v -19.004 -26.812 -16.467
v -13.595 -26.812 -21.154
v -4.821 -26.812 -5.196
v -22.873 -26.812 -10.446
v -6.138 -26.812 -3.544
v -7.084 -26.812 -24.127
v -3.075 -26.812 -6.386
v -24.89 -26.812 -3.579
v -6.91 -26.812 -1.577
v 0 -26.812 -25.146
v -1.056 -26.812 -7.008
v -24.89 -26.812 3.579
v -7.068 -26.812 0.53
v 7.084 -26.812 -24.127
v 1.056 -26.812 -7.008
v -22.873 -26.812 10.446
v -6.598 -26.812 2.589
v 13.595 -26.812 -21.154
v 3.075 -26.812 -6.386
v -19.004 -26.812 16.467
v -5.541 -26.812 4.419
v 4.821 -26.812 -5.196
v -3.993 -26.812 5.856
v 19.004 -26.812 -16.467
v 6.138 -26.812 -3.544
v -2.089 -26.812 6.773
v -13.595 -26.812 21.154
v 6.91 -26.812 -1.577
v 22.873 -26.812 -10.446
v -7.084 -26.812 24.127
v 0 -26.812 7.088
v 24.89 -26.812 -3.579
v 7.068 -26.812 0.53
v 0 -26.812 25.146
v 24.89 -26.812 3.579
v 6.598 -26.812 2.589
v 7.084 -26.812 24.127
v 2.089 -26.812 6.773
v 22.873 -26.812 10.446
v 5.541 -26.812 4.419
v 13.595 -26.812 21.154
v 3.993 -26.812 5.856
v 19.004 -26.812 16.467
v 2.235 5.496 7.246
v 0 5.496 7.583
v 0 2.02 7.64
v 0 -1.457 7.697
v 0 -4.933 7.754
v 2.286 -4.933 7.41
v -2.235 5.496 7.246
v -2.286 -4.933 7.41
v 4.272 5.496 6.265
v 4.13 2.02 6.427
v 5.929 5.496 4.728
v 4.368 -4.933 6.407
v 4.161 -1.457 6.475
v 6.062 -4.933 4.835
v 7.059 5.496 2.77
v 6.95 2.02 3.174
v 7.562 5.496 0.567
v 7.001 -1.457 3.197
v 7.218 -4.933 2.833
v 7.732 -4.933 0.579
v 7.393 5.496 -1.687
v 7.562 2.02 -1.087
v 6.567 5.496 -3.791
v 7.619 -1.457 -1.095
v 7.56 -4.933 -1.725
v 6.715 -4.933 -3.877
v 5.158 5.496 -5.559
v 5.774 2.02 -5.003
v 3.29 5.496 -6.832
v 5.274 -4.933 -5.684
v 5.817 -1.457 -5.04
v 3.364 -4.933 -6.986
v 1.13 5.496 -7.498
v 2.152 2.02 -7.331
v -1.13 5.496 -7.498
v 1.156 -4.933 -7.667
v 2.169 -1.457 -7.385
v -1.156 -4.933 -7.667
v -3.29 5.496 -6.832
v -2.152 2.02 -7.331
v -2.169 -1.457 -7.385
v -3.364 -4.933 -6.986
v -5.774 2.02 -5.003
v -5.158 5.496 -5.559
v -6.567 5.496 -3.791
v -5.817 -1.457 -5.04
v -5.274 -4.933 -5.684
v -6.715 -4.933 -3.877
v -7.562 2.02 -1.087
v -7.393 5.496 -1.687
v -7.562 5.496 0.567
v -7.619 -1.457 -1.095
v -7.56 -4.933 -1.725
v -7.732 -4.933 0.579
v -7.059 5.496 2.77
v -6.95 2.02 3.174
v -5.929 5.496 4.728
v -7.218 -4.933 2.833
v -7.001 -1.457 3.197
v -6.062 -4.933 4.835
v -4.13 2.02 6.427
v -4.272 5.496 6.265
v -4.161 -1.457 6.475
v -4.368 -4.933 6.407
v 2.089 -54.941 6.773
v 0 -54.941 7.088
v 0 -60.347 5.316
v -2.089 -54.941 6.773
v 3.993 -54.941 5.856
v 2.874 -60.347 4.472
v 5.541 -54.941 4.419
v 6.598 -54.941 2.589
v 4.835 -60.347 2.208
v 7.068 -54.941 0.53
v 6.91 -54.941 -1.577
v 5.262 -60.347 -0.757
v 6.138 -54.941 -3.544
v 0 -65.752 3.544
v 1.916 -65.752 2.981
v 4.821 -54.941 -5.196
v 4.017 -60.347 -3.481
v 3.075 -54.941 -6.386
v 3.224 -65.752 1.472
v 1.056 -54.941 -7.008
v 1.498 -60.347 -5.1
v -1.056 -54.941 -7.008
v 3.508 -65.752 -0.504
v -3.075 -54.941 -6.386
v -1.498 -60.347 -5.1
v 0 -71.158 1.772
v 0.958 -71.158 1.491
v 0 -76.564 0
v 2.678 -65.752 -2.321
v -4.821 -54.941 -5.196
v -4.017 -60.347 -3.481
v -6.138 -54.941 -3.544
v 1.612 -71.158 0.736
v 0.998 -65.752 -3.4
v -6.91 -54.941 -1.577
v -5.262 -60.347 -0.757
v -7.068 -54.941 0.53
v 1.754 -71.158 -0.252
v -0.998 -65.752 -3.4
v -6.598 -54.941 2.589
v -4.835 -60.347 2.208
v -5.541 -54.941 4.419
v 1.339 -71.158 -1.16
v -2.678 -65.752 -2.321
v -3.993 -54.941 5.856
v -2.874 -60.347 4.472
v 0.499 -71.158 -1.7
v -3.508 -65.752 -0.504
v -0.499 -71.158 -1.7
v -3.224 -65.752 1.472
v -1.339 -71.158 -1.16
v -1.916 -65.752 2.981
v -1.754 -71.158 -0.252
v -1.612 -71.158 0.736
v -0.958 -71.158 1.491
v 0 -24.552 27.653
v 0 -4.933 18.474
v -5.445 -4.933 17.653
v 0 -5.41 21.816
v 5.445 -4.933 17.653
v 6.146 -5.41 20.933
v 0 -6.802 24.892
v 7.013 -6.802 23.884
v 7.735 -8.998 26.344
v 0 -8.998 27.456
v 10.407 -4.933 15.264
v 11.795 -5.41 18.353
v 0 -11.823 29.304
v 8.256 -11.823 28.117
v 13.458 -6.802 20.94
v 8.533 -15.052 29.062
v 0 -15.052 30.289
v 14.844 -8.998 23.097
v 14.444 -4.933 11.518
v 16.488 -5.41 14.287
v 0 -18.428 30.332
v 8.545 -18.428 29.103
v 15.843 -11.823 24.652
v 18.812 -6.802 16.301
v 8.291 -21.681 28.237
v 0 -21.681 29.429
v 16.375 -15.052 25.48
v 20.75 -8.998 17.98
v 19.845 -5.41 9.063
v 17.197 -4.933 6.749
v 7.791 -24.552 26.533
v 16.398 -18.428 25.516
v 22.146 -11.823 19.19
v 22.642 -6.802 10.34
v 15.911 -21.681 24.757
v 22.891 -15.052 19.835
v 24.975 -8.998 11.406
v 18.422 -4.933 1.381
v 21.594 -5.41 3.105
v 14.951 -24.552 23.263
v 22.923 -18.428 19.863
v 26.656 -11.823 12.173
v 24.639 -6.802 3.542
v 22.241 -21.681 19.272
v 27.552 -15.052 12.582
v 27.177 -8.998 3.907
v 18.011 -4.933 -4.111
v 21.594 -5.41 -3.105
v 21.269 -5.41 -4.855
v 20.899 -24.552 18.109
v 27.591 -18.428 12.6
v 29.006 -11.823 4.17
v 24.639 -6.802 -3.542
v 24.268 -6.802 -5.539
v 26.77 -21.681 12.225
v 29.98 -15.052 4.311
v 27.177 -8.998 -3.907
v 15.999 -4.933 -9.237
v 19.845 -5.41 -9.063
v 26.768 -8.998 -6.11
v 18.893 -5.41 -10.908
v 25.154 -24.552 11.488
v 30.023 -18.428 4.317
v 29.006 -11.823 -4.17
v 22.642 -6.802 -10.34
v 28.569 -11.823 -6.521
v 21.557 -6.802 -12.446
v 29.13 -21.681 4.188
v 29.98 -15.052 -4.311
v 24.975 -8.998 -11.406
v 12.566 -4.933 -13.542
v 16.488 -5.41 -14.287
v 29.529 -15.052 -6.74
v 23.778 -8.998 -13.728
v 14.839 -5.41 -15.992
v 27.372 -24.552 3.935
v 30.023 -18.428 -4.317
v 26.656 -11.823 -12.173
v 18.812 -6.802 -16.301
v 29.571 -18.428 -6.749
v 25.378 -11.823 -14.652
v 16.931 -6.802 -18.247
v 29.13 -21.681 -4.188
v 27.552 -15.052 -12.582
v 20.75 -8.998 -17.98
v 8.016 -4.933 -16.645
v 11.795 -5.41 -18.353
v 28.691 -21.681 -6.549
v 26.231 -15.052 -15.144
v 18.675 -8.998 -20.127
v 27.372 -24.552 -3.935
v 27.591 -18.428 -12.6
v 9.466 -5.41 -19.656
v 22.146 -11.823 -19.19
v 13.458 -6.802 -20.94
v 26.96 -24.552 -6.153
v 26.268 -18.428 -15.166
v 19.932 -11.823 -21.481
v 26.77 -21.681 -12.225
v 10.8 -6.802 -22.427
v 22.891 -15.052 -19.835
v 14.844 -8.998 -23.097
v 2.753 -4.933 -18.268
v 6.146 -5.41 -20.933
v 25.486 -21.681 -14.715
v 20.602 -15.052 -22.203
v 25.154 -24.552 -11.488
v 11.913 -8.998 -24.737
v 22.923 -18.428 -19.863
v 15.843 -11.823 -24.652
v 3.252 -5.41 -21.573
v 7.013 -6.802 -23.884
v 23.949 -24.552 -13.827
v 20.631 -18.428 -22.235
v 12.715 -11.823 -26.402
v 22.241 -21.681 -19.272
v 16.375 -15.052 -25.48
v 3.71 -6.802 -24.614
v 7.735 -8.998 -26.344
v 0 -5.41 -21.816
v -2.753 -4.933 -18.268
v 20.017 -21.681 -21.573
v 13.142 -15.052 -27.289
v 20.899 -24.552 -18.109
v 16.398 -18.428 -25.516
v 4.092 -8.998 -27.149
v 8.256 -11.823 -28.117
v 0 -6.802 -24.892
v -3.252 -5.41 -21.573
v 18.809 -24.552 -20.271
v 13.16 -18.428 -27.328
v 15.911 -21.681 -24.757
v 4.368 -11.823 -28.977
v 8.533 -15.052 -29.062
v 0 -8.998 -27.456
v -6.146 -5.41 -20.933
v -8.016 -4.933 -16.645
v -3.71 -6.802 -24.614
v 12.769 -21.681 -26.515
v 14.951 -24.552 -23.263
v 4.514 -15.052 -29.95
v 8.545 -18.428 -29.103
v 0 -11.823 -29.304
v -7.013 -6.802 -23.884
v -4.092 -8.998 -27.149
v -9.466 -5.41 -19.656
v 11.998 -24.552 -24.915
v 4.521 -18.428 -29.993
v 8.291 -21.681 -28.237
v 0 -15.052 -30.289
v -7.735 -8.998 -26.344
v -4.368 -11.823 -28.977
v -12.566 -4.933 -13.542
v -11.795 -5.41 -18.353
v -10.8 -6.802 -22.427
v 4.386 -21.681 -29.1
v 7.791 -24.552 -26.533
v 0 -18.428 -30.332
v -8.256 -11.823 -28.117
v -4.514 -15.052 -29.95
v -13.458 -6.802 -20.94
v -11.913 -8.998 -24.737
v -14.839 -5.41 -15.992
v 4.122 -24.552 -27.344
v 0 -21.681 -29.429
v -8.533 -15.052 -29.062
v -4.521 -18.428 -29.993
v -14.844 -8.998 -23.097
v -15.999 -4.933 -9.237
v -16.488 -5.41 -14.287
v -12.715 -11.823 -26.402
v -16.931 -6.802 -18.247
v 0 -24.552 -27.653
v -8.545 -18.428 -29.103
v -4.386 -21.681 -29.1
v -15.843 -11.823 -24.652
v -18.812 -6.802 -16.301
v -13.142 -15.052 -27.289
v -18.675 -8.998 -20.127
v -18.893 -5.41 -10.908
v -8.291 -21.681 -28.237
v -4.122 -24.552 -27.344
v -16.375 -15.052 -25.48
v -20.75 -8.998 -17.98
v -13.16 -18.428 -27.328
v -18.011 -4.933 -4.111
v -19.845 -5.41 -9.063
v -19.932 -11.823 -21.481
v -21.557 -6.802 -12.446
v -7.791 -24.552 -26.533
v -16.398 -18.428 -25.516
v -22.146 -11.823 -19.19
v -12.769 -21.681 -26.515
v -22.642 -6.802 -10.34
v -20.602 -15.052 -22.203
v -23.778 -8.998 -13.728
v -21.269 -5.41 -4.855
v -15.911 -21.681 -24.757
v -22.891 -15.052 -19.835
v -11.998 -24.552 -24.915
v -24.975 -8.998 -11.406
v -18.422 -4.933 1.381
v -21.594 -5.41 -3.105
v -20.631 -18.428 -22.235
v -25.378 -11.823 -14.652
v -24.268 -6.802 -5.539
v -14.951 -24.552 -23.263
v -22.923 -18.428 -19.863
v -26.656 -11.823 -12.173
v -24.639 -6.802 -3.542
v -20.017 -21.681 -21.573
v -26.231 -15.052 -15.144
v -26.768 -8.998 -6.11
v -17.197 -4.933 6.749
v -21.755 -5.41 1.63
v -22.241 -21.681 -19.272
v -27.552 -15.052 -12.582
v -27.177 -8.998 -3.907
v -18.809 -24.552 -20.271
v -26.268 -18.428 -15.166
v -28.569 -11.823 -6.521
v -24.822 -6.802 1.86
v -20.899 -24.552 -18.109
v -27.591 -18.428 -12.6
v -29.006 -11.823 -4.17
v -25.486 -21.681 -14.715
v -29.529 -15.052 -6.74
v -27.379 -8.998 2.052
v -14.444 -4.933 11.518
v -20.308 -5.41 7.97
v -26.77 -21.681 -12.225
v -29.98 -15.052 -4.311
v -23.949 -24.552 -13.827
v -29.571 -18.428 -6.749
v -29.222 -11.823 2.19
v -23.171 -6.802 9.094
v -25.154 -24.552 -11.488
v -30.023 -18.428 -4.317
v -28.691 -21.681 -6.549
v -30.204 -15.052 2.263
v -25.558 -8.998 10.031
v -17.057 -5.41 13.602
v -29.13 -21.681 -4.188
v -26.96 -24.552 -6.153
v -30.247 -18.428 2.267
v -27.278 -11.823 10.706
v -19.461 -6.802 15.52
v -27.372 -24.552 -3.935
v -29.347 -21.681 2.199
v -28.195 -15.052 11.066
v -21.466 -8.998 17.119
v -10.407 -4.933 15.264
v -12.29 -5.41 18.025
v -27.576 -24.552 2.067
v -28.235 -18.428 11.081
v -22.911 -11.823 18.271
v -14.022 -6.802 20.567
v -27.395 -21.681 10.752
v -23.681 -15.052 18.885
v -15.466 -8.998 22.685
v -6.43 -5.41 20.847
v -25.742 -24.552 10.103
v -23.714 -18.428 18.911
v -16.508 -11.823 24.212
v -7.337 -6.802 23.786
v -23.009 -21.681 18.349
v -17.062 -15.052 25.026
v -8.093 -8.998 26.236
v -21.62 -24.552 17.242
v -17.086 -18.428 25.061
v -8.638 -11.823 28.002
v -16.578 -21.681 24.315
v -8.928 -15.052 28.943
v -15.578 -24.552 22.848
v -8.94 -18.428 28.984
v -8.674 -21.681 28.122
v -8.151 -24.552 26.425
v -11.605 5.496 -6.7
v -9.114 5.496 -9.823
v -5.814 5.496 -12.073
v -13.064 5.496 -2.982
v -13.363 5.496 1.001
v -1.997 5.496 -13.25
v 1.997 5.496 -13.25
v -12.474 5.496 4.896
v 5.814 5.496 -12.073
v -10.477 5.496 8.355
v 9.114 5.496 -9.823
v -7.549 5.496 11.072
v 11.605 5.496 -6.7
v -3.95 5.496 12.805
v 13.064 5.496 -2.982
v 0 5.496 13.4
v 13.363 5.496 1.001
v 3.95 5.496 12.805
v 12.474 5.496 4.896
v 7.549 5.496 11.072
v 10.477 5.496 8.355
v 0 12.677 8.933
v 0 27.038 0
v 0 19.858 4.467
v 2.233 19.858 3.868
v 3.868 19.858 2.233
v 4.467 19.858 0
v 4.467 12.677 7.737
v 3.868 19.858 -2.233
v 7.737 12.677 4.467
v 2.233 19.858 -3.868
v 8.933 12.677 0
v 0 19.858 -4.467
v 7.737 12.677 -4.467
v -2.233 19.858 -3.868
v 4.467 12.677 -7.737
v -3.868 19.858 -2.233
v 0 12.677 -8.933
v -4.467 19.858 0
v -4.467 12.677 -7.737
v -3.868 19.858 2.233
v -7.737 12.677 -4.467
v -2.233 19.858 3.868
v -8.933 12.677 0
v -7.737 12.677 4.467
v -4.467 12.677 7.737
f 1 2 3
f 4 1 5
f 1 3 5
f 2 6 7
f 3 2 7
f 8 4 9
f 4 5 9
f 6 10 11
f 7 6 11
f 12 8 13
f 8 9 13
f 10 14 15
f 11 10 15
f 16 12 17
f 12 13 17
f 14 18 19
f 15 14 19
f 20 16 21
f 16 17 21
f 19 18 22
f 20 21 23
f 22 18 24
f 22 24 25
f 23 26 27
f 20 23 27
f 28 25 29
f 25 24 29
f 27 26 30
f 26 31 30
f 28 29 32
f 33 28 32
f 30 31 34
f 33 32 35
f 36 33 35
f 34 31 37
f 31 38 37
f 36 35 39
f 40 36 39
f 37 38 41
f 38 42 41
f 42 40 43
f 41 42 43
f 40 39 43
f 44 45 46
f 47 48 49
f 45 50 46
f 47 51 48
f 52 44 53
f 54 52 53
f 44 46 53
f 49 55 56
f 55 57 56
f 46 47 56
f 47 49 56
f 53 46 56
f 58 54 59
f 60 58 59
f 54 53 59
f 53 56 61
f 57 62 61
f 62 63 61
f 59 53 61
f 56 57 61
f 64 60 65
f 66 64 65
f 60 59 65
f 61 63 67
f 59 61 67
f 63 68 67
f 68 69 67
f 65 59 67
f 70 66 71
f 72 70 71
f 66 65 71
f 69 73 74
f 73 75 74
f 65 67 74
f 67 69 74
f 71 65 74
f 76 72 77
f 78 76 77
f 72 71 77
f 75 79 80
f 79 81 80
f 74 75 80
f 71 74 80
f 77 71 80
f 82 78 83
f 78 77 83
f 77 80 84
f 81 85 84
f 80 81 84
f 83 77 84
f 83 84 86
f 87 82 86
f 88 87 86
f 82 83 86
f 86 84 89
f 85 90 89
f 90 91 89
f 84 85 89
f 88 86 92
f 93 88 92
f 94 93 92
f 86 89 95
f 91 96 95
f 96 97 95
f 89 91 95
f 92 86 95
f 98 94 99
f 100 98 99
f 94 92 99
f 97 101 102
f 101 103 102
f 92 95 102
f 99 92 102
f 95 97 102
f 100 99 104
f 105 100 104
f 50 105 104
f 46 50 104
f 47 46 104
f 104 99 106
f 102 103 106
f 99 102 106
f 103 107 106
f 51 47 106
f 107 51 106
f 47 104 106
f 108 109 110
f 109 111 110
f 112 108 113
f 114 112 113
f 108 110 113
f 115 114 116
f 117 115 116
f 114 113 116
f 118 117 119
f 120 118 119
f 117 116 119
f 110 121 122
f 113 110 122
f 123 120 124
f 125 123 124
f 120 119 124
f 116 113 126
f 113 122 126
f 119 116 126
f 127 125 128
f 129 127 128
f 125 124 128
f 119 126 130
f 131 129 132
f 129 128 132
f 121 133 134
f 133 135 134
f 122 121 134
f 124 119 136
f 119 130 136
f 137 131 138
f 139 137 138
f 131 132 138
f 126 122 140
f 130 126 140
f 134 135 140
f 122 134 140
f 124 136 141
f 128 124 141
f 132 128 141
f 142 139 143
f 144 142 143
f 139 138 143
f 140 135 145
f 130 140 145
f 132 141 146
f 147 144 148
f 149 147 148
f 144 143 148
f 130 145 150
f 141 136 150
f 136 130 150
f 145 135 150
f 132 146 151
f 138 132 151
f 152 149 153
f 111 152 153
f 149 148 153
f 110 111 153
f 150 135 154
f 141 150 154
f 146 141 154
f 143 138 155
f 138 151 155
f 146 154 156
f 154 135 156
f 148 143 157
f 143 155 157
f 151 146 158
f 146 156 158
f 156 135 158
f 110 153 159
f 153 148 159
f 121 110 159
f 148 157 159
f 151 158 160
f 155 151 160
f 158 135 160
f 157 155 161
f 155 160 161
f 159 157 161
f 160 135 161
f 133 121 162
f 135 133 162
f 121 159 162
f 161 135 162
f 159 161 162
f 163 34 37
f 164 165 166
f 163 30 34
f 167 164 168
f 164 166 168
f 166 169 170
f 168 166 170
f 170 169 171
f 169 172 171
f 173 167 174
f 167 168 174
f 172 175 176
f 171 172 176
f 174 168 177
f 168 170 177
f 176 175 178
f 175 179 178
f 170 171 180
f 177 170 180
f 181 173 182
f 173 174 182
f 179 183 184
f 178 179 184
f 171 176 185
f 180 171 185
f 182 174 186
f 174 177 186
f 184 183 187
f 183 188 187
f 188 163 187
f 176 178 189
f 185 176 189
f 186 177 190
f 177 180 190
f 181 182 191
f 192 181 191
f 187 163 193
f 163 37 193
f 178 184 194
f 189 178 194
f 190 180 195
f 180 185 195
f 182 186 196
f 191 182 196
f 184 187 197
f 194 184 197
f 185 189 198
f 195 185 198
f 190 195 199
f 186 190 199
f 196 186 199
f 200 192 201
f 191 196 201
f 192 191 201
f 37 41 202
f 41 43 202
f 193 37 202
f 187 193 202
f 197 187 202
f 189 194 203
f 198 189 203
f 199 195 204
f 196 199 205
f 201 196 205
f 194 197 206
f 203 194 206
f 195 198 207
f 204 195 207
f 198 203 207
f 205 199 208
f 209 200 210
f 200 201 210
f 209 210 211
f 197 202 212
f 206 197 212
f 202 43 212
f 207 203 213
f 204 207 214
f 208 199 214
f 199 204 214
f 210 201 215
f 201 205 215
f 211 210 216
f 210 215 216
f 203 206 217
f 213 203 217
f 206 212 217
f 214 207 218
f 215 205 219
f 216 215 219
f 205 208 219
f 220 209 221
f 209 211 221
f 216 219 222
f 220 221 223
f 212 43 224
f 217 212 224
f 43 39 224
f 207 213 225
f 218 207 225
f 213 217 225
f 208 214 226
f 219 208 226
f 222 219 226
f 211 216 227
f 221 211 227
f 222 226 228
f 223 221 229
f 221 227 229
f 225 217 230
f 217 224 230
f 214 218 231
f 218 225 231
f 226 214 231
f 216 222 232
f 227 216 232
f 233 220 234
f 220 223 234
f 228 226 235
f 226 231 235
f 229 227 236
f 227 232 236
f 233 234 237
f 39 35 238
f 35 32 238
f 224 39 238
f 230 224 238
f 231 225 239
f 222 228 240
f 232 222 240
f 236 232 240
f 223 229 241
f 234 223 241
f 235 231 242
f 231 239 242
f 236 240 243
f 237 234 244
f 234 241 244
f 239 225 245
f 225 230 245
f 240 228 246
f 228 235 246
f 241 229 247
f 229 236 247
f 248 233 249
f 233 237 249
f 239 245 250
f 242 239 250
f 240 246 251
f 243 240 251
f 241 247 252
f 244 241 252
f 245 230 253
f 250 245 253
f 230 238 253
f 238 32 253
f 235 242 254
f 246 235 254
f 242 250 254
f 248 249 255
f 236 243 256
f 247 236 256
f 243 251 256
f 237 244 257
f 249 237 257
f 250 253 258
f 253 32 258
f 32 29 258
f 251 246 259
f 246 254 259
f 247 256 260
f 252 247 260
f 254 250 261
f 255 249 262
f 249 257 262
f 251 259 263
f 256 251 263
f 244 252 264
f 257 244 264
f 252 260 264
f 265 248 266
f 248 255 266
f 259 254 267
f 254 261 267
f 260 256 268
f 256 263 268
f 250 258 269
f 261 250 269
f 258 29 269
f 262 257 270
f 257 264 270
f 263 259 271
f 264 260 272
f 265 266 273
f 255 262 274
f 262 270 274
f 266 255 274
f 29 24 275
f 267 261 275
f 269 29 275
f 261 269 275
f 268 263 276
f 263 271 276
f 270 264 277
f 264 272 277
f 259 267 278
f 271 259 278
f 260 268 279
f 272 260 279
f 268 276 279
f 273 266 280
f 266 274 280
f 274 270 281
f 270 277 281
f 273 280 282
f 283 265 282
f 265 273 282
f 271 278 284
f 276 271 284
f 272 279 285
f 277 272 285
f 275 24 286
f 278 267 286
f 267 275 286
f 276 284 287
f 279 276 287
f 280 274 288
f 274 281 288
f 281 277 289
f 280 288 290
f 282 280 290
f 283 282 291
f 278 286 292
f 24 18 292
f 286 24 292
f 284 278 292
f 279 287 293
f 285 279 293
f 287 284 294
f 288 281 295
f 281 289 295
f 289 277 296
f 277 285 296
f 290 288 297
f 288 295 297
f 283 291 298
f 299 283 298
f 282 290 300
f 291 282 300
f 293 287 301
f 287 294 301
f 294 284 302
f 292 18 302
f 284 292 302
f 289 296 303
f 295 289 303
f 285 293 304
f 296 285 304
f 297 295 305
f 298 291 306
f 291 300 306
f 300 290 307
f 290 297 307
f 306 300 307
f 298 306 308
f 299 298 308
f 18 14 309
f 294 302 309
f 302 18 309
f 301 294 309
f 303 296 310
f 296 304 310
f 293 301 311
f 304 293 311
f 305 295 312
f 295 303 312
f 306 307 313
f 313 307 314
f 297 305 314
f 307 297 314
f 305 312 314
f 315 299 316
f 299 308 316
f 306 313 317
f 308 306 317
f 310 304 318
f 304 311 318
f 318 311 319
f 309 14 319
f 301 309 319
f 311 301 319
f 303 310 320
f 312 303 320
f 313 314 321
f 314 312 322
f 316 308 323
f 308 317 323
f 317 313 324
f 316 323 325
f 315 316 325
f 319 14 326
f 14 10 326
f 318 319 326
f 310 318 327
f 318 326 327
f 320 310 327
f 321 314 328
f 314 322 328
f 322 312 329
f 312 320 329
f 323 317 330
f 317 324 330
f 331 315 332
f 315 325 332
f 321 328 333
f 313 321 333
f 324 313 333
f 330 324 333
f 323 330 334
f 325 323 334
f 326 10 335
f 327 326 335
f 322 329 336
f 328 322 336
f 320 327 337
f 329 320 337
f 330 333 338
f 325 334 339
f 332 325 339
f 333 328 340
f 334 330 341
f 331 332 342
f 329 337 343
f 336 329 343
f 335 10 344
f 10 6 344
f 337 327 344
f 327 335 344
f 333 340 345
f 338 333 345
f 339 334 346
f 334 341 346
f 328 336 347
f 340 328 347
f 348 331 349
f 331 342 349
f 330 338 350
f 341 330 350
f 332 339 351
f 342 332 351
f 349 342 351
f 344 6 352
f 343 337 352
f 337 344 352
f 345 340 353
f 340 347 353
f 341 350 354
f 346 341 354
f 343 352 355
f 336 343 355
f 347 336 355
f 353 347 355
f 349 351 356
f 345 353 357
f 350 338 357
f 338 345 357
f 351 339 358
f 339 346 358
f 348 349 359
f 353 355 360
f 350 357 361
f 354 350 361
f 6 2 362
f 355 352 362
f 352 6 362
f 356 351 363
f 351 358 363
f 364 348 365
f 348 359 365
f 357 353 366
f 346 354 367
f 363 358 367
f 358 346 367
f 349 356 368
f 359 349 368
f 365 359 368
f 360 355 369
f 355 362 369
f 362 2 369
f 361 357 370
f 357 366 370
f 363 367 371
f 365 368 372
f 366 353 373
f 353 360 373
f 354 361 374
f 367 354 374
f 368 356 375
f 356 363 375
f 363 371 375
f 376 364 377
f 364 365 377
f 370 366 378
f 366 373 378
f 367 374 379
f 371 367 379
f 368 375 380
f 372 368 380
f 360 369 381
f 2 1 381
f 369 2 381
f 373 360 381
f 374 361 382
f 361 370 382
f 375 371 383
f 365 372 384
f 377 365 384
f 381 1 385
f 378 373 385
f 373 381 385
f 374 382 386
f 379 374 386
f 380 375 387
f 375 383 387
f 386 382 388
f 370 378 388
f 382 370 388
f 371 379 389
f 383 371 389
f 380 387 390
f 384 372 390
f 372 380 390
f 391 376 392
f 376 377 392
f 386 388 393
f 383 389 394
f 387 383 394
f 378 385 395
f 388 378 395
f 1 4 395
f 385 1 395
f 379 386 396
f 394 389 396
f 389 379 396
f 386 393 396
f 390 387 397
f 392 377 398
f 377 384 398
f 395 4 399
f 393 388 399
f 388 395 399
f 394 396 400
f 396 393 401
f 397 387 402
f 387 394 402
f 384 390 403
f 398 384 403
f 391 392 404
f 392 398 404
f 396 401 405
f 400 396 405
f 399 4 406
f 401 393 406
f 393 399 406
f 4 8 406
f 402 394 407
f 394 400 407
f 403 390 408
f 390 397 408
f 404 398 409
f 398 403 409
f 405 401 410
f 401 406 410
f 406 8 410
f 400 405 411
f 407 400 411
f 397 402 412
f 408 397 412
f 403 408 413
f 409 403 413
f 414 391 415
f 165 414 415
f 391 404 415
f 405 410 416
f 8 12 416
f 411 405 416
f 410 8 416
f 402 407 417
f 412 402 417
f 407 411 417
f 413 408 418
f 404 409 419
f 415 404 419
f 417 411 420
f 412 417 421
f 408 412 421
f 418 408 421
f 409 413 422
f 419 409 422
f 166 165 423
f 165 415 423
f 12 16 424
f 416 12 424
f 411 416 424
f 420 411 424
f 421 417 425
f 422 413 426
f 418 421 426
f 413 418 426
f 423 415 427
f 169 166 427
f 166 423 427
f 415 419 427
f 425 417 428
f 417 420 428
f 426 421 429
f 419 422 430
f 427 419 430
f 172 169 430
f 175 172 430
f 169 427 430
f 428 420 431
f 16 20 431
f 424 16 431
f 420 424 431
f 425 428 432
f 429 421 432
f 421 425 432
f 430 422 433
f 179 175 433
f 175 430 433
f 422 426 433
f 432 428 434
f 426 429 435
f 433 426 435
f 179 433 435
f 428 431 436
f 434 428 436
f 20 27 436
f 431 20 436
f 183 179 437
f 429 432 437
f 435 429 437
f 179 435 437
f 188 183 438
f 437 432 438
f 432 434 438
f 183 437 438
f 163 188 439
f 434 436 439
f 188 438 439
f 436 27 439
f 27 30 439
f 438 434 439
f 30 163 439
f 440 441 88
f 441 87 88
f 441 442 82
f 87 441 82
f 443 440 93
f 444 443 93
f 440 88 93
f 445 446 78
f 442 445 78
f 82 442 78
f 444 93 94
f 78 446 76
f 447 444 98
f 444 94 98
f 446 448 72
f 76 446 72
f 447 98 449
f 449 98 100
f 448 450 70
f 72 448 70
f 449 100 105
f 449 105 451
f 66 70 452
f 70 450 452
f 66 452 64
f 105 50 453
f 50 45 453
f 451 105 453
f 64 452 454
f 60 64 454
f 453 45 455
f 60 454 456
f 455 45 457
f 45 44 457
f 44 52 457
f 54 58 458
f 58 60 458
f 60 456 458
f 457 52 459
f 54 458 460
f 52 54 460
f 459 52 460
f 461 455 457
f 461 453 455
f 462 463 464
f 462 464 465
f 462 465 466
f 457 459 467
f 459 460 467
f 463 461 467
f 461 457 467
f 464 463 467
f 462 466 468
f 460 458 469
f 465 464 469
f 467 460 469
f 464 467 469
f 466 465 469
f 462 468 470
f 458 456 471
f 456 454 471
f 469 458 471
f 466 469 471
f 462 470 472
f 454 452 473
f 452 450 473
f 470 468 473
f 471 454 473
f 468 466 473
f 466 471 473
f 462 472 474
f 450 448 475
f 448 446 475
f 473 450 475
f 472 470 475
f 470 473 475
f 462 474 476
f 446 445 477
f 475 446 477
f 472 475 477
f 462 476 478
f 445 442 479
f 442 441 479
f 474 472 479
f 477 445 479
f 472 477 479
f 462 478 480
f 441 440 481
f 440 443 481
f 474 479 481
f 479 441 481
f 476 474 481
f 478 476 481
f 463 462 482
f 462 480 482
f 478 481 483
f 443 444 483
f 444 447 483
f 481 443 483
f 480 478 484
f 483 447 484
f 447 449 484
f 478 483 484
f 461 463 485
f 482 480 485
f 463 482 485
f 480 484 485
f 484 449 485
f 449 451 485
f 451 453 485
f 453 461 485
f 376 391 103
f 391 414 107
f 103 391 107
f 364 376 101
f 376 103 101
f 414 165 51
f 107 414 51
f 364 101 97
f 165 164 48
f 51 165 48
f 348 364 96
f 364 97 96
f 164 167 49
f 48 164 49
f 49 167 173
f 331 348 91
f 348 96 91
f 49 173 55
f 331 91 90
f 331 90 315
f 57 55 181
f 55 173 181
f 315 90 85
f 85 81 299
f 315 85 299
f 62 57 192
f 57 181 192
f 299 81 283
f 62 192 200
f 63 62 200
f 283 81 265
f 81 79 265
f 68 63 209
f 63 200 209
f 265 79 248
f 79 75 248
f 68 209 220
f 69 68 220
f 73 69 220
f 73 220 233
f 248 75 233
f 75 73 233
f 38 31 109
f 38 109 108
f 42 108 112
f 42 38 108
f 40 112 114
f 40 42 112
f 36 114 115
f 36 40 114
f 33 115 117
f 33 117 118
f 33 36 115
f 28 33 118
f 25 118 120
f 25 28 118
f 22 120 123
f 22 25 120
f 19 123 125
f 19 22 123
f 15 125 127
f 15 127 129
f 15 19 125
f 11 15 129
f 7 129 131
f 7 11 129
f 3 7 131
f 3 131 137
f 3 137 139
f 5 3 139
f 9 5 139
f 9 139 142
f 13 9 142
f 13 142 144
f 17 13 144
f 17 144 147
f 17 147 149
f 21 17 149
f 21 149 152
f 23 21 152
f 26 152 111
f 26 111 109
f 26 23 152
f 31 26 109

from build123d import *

# Parameters (mm, degrees)
F2_W = 54.9414514213
F2_H = 7.087636739


with BuildPart() as f1:
    # F0 (on Right) → F1 (revolve)
    with BuildSketch(Plane.YZ):
        with BuildLine():
            Line((-26.8122032285, 25.1458510756), (-26.8122032285, 0))
            Line((-26.8122032285, 0), (0, 0))
            Line((0, 0), (27.0384699106, 0))
            Line((27.0384699106, 0), (5.4959878325, 13.4000256658))
            Line((5.4959878325, 13.4000256658), (5.4959878325, 7.5829699636))
            Line((5.4959878325, 7.5829699636), (-4.9333125353, 7.7540650964))
            Line((-4.9333125353, 7.7540650964), (-4.9333125353, 18.4741187841))
            ThreePointArc((-4.9333125353, 18.4741187841), (-13.4024776279, 29.9108782654), (-26.8122032285, 25.1458510756))
        make_face()
    revolve(axis=Axis((0, -13.4061016142, 0), (0, 1, 0)))

    # F2 (on Right) → F3 (revolve)
    with BuildSketch(Plane.YZ):
        with Locations((-27.4707257106, 3.5438183695)):
            Rectangle(F2_W, F2_H)
        Polygon((-54.9414514213, 0), (-54.9414514213, 7.087636739), (-76.563516876, 0), align=None)
    revolve(axis=Axis((0, -27.4707257106, 0), (0, 1, 0)))


solid = f1.part
